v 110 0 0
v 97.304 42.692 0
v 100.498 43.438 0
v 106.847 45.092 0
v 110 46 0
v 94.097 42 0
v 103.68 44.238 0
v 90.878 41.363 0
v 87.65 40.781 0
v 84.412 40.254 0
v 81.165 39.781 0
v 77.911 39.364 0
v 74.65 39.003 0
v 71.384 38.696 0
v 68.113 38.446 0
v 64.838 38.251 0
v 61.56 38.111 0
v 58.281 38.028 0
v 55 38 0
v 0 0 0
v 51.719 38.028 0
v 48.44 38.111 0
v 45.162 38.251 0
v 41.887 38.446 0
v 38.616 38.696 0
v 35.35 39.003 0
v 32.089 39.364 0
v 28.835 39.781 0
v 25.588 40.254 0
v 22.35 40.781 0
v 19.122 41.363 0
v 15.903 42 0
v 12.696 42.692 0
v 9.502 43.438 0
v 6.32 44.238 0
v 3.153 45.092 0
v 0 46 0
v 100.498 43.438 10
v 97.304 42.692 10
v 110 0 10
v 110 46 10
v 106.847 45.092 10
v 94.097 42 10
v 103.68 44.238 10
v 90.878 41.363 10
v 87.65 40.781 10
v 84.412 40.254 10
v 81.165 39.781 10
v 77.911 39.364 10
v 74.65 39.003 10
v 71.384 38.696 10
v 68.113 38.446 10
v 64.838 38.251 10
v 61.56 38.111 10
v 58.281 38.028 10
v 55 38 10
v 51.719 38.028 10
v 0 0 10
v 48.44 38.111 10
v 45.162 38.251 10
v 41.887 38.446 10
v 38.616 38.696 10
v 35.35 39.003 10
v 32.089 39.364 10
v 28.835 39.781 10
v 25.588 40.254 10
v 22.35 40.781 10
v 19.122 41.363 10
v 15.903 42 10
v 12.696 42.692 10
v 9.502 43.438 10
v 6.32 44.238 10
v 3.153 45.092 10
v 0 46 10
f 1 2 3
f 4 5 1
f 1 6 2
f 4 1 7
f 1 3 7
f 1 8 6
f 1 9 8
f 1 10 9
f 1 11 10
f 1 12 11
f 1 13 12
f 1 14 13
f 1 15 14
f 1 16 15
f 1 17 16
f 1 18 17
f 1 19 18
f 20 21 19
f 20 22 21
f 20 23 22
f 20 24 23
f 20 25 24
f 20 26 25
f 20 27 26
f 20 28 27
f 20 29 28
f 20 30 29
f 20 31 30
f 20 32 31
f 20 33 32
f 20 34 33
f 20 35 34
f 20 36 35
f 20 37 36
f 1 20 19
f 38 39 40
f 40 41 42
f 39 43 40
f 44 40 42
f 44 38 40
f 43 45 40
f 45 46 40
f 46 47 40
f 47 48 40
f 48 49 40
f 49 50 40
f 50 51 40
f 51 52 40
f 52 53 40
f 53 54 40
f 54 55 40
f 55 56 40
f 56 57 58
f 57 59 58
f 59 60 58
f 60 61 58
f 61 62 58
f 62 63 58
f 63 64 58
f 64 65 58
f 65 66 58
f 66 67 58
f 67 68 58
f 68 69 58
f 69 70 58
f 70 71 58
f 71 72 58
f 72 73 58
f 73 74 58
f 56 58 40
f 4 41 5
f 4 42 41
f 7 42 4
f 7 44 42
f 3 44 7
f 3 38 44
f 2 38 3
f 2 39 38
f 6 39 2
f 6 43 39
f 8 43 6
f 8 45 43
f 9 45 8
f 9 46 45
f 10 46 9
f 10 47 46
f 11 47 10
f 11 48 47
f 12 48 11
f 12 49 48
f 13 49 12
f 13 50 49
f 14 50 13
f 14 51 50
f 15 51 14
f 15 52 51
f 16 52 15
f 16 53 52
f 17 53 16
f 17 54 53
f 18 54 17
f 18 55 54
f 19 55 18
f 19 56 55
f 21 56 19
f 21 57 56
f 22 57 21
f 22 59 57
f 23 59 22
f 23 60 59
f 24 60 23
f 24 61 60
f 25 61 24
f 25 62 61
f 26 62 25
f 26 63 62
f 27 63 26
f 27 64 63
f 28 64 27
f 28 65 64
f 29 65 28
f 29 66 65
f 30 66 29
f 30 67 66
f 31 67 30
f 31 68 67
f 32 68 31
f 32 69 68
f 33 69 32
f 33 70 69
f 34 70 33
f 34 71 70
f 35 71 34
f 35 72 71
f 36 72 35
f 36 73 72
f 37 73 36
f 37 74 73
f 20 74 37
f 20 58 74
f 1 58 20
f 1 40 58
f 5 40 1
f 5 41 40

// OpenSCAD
$fn = 32;

// ----------------------------------------------------------------------
// Arc profile plate: notch, 37 points
// ----------------------------------------------------------------------

// --- parameters (mm) ---
bar_l = 110;              // bar length, X
bar_w = 46;               // bar width, Y
notch_depth = 8;          // depth of the arc notch at mid-span
arc_r = 193.06;           // radius of the notch arc
arc_angle = 33.1;         // notch arc angle, degrees
arc_step = 1;             // sampling step of the notch arc, degrees
plate_t = 10;             // plate thickness, Z

profile = [[0, 0], [110, 0], [110, 46], [106.847, 45.092], [103.68, 44.238], [100.498, 43.438], [97.304, 42.692], [94.097, 42], [90.878, 41.363], [87.65, 40.781], [84.412, 40.254], [81.165, 39.781], [77.911, 39.364], [74.65, 39.003], [71.384, 38.696], [68.113, 38.446], [64.838, 38.251], [61.56, 38.111], [58.281, 38.028], [55, 38], [51.719, 38.028], [48.44, 38.111], [45.162, 38.251], [41.887, 38.446], [38.616, 38.696], [35.35, 39.003], [32.089, 39.364], [28.835, 39.781], [25.588, 40.254], [22.35, 40.781], [19.122, 41.363], [15.903, 42], [12.696, 42.692], [9.502, 43.438], [6.32, 44.238], [3.153, 45.092], [0, 46]];  // primary outline, 37 points, counter clockwise

// --- the one profile operation ---
linear_extrude(height = plate_t) polygon(points = profile);
